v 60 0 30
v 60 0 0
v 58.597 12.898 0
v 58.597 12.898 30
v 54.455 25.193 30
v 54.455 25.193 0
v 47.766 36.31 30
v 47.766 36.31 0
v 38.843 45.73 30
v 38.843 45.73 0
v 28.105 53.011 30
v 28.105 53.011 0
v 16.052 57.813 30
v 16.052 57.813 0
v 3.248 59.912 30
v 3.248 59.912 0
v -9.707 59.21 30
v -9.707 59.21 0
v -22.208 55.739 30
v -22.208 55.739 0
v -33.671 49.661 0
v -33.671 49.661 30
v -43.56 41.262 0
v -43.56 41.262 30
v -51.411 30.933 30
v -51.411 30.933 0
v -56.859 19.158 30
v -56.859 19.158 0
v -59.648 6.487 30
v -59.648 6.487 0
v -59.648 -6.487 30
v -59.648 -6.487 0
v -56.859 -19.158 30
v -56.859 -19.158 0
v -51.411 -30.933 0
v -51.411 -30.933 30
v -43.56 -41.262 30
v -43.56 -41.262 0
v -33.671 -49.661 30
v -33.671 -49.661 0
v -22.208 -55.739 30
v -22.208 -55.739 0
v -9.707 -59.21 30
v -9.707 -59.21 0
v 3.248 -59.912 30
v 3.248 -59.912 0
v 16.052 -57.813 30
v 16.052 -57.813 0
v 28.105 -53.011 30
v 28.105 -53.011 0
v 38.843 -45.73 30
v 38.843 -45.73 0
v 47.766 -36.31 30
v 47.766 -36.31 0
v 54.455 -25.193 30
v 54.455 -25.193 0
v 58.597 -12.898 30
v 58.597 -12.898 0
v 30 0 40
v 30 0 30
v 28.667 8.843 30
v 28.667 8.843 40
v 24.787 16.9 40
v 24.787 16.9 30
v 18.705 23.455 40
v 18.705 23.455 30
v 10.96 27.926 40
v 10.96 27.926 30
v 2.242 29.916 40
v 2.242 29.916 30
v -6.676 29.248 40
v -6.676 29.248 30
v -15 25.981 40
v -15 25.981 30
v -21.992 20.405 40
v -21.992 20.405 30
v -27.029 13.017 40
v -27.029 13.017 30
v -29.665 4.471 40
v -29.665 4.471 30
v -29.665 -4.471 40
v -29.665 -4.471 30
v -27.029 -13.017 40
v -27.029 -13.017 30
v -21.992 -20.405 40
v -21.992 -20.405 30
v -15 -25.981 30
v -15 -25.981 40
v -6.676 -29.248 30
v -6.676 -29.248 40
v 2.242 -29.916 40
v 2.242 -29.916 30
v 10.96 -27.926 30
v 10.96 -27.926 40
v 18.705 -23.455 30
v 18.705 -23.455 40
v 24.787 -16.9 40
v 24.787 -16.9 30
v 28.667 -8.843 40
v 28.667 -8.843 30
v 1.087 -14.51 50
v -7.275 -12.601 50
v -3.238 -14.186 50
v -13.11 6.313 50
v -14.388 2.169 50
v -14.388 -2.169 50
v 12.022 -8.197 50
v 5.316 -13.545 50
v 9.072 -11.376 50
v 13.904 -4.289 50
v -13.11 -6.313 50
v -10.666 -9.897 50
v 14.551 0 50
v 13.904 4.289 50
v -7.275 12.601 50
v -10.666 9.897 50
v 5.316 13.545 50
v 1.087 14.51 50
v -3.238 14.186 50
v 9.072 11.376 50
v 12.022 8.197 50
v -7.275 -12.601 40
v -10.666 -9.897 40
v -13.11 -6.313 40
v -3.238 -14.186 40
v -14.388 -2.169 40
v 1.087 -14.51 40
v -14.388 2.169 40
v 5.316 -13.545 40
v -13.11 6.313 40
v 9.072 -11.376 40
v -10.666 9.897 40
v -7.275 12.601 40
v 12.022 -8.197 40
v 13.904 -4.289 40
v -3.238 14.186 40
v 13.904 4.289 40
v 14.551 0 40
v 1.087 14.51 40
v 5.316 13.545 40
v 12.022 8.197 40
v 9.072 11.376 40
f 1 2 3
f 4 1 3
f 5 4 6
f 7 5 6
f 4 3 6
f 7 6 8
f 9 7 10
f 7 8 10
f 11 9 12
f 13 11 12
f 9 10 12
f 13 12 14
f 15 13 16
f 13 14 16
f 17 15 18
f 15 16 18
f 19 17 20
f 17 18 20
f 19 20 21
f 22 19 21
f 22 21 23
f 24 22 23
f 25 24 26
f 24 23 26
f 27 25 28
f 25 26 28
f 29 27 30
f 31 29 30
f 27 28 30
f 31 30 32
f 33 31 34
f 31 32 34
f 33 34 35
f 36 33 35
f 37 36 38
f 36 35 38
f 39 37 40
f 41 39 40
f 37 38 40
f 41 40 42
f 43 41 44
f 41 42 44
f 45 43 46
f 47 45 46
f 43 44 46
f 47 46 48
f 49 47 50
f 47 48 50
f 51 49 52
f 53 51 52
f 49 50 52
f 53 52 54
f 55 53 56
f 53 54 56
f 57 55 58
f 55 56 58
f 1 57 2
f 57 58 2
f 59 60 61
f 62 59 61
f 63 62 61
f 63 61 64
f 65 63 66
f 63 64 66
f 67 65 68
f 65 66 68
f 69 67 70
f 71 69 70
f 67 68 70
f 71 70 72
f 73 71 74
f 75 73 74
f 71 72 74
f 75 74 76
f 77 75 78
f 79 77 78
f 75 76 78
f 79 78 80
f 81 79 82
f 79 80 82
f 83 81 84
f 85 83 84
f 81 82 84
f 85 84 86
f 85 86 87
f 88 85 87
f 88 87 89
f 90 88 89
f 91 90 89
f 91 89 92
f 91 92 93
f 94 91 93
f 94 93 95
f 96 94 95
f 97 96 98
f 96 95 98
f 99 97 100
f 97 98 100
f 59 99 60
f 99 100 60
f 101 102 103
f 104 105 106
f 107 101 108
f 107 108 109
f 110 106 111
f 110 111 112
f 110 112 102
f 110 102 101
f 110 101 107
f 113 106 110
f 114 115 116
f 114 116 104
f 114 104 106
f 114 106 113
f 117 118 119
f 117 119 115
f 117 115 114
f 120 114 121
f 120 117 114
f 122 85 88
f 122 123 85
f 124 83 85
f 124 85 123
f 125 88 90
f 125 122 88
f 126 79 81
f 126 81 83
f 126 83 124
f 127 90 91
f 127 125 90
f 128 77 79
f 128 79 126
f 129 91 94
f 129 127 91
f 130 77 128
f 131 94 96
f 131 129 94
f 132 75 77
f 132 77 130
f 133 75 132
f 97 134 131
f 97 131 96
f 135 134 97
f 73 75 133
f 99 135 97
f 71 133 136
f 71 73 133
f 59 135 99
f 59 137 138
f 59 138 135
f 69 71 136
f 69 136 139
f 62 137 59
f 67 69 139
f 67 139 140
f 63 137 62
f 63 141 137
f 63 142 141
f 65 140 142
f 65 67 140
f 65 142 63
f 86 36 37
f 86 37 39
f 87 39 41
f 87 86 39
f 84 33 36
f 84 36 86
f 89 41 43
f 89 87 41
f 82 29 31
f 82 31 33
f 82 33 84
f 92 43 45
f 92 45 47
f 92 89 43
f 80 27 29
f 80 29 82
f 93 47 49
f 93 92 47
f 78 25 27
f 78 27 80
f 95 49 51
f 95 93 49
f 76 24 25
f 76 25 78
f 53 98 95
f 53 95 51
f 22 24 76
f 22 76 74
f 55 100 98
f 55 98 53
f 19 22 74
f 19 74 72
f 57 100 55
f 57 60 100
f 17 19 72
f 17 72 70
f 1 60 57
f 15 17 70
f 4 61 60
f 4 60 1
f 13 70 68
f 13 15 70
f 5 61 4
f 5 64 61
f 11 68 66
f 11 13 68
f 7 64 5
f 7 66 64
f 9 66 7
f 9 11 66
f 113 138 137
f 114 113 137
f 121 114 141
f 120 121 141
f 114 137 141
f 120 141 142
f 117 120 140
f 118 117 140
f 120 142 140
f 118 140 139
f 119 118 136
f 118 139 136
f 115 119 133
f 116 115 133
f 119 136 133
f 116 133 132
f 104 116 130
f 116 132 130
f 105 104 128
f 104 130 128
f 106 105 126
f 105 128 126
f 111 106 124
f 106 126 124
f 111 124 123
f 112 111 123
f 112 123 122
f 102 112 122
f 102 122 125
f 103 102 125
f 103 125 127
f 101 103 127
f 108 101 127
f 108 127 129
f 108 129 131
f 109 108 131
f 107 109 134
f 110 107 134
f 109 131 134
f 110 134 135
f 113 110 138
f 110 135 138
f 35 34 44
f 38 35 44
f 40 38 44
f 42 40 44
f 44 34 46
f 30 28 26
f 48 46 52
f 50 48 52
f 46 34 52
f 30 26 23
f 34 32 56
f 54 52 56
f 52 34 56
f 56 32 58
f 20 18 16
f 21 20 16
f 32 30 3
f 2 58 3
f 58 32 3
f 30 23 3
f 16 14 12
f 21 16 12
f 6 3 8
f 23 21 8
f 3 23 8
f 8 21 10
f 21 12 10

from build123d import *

# Parameters (mm, degrees)
F0_R     = 60
F1_DEPTH = 30
F2_R     = 30
F3_DEPTH = 10
F4_R     = 14.550501
F5_DEPTH = 10


with BuildPart() as f1:
    # F0 (on Top) → F1 (new body)
    with BuildSketch(Plane.XY):
        Circle(F0_R)
    extrude(amount=F1_DEPTH)

    # F2 (on face) → F3 (join)
    with BuildSketch(Plane.XY.offset(30)):
        Circle(F2_R)
    extrude(amount=F3_DEPTH)

    # F4 (on face) → F5 (join)
    with BuildSketch(Plane.XY.offset(40)):
        Circle(F4_R)
    extrude(amount=F5_DEPTH)


solid = f1.part
